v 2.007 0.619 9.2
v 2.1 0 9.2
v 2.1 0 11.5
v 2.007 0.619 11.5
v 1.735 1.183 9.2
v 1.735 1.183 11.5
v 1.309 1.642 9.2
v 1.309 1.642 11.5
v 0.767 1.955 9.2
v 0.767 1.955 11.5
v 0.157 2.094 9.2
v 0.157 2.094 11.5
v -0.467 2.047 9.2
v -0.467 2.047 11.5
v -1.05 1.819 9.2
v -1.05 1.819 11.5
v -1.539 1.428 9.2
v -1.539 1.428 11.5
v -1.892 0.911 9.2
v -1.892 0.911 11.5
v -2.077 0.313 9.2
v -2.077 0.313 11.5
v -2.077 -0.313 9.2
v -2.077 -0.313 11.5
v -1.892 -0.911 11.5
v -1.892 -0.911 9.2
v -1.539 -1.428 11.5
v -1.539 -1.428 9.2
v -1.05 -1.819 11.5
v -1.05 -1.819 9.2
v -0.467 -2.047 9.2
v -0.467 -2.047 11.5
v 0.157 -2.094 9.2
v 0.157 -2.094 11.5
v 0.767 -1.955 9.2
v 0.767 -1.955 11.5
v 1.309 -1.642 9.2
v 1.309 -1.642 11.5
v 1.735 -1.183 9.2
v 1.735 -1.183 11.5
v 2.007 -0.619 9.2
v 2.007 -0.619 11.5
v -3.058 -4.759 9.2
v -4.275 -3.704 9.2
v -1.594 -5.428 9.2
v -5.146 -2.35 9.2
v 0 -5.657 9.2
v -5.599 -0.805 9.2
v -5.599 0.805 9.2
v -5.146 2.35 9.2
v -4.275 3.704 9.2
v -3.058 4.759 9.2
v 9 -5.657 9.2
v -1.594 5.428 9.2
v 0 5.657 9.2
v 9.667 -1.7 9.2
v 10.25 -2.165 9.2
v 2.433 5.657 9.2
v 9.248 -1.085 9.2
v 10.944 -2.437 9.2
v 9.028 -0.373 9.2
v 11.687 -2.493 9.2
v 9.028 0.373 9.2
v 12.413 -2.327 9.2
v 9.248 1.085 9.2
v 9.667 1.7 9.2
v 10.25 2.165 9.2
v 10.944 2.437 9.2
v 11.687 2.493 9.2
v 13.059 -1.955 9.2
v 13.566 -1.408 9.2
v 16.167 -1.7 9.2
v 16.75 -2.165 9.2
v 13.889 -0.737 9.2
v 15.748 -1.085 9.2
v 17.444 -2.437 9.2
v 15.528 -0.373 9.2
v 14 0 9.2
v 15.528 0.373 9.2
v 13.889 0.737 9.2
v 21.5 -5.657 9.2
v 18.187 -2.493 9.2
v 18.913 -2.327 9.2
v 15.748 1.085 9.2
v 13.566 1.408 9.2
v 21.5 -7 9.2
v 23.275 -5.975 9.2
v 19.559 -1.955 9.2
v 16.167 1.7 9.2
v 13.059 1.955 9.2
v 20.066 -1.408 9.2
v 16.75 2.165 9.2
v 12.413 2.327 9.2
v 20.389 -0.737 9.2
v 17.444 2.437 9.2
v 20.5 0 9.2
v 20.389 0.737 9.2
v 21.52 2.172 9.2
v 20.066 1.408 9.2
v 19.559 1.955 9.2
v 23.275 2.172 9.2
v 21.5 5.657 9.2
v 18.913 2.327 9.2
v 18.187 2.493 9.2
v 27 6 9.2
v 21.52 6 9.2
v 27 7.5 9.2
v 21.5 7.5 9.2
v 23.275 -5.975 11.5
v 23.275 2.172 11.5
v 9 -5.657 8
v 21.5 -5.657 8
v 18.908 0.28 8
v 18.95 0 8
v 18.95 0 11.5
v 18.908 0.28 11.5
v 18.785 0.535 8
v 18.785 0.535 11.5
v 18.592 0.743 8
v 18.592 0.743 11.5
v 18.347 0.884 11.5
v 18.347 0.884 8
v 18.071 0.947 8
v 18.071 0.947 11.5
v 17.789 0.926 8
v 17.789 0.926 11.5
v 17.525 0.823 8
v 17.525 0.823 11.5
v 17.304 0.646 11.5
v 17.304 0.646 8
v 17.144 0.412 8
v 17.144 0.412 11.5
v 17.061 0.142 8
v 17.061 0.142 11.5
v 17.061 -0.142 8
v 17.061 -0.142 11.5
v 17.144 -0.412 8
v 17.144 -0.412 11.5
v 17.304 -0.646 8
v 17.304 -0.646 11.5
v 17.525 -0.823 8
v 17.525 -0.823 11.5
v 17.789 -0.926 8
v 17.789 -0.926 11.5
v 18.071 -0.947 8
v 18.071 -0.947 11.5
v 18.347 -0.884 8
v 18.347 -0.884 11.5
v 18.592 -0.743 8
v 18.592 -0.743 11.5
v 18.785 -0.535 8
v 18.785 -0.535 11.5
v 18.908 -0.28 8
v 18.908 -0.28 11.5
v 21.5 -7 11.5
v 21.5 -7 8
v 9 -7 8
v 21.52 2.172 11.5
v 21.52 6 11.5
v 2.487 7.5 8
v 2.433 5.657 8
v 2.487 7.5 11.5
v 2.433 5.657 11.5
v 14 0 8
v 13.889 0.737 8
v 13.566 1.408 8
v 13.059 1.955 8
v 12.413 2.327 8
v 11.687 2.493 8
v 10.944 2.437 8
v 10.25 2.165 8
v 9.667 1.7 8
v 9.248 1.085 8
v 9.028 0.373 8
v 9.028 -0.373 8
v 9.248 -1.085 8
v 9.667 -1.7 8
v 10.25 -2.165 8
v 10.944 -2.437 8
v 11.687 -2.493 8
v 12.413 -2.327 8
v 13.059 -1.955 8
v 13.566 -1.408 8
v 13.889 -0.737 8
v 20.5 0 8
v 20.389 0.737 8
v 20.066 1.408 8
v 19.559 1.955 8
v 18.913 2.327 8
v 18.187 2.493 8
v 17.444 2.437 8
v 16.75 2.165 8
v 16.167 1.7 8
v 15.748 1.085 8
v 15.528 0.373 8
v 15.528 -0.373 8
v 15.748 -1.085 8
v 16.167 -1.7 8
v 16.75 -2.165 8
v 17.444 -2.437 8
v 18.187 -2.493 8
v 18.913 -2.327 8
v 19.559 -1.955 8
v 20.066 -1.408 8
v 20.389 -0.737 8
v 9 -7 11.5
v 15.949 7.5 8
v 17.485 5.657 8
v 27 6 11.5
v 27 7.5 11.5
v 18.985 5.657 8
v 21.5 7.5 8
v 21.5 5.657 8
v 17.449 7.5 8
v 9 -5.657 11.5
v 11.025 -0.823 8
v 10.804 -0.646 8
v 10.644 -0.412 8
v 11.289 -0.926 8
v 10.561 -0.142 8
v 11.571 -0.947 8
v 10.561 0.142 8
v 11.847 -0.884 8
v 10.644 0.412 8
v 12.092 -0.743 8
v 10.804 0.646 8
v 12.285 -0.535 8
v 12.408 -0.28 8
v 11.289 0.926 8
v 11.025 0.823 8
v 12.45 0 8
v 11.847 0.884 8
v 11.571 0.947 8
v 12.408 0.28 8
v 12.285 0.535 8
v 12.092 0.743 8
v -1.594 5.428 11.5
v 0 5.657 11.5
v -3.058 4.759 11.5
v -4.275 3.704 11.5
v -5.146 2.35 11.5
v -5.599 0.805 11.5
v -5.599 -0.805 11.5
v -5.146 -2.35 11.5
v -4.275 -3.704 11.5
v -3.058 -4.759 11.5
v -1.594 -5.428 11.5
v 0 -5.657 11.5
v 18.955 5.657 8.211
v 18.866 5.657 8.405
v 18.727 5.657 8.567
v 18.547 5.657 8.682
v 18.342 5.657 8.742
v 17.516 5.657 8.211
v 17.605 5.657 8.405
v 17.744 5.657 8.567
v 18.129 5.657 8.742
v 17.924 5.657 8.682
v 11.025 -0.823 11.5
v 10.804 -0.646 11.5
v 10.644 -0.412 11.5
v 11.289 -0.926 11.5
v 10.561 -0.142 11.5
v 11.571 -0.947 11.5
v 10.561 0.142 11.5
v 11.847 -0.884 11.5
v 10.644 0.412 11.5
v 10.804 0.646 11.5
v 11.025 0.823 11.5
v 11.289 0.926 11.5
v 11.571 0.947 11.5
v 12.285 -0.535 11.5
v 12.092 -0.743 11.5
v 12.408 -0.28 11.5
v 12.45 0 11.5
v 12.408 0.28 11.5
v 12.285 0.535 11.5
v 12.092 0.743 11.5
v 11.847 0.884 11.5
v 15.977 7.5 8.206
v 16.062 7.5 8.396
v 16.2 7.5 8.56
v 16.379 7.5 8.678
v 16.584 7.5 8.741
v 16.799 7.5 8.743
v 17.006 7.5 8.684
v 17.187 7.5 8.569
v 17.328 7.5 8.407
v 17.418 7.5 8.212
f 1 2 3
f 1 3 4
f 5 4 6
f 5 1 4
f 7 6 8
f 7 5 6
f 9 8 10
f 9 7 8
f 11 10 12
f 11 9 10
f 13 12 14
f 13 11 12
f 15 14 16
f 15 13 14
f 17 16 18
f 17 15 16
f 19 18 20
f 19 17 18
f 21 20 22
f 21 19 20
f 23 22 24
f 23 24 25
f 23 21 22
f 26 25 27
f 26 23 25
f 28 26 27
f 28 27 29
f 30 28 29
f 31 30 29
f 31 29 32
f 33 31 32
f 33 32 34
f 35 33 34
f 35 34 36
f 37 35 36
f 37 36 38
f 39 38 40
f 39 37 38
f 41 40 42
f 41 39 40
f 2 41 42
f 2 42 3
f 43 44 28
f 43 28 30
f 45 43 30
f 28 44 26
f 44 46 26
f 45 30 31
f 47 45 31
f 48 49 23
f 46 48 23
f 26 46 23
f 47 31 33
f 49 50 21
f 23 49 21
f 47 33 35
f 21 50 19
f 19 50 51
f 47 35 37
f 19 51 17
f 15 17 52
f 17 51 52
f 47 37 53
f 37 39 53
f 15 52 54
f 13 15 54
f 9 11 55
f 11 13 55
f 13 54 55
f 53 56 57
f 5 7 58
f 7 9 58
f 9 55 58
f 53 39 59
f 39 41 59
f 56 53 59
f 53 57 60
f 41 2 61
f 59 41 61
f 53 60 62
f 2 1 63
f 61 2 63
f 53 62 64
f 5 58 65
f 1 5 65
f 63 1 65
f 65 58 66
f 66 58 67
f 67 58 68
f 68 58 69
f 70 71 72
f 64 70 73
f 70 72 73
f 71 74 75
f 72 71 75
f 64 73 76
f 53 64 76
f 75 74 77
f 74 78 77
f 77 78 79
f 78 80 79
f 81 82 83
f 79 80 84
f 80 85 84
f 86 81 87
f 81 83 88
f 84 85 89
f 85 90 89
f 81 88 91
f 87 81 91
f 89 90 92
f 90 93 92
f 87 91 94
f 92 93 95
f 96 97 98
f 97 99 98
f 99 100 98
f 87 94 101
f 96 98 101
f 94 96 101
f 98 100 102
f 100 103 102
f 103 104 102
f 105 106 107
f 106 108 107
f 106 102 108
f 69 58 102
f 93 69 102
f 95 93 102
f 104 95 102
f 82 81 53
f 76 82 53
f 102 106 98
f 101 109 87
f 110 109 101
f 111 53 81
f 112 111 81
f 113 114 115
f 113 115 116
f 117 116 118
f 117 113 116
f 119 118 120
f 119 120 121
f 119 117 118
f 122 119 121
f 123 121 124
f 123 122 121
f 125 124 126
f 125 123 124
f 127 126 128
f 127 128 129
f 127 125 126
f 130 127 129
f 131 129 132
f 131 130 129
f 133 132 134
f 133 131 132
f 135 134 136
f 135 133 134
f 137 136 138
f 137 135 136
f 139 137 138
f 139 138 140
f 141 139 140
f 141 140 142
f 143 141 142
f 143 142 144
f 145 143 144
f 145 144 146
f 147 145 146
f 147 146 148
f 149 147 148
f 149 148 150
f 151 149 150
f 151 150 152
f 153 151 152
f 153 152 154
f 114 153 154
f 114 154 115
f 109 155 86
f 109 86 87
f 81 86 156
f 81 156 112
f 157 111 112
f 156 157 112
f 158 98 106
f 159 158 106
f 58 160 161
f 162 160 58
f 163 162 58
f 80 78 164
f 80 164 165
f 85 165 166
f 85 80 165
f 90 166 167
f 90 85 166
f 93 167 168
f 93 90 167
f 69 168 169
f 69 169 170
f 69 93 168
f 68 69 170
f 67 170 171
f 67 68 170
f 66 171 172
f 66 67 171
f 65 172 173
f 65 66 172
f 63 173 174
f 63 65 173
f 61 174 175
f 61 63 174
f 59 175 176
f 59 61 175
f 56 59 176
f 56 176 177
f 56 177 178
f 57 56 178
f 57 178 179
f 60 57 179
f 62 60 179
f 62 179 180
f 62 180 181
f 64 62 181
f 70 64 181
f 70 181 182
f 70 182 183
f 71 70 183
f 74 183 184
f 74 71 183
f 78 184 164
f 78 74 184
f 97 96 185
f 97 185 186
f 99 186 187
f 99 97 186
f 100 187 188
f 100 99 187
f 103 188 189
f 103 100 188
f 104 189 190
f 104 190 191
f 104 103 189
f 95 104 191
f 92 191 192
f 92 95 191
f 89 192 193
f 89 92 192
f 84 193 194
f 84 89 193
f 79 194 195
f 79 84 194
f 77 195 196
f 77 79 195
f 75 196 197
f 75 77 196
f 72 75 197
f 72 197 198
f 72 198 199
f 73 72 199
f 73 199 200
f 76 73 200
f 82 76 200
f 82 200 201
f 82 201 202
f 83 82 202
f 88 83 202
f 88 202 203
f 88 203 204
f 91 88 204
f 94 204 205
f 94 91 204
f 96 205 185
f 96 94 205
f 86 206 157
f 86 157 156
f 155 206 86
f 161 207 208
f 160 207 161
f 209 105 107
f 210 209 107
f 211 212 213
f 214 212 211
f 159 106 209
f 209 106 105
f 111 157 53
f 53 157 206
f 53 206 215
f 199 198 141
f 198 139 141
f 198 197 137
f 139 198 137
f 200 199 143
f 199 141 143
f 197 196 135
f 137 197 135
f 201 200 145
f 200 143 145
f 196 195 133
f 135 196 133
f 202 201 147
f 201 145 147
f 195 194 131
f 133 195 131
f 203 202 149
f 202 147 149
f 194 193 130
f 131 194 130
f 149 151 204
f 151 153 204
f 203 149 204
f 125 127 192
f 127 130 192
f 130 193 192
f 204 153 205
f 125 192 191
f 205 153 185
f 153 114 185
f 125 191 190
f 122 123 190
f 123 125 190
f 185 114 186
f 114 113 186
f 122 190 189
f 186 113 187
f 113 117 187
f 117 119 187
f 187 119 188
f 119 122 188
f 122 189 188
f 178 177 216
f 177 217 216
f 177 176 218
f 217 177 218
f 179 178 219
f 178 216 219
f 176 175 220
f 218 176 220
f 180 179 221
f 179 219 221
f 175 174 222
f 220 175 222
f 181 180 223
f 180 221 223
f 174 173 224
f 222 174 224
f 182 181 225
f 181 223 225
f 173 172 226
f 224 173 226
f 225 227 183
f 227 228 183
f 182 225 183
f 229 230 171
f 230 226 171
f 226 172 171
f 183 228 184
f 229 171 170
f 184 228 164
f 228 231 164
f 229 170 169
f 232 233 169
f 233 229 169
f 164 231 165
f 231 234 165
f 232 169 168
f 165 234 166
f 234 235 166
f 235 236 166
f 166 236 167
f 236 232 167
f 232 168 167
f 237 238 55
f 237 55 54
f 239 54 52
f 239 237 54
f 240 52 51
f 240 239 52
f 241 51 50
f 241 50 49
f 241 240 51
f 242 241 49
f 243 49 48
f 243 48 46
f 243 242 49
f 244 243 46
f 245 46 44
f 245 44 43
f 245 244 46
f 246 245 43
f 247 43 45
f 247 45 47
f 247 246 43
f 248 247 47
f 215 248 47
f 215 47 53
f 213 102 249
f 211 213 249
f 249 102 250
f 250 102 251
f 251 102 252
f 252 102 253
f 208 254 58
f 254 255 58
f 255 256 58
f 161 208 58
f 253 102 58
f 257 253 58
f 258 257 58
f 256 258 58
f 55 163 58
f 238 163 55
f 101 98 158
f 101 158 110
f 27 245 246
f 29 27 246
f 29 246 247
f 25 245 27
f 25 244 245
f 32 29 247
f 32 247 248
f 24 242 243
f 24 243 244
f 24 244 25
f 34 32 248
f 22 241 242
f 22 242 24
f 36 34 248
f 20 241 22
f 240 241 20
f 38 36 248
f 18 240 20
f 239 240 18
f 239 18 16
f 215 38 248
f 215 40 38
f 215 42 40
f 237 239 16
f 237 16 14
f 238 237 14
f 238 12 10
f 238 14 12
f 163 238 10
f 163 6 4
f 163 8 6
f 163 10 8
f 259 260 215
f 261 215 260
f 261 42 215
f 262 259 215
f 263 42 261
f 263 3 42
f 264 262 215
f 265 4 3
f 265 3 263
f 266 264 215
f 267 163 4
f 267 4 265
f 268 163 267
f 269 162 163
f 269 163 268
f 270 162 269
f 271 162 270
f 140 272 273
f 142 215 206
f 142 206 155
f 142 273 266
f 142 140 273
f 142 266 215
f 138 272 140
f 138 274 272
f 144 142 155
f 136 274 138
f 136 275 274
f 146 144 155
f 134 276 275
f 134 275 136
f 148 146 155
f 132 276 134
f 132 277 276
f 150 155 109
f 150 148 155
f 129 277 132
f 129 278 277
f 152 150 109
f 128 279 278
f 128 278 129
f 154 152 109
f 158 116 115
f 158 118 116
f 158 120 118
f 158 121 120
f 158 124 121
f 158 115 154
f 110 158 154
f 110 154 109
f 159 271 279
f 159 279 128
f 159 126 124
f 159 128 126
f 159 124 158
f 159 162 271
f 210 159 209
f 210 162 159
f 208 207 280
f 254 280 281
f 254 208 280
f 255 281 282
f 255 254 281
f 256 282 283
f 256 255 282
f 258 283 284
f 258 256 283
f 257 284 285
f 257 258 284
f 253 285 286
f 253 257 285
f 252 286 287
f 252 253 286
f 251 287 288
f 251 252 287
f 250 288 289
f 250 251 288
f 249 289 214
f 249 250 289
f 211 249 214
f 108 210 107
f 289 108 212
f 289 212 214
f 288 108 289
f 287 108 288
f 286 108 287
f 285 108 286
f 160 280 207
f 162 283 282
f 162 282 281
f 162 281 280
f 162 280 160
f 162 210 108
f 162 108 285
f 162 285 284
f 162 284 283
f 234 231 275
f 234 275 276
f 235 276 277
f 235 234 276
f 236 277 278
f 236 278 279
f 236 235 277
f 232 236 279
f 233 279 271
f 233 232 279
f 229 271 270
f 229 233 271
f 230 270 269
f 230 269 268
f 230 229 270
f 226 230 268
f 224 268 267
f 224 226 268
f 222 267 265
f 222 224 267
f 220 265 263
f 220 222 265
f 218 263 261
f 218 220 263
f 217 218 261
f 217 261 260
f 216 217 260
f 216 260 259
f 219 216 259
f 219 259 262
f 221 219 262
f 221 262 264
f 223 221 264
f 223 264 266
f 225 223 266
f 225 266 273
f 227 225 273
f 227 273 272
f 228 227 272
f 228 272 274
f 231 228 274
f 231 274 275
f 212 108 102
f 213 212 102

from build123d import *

# Parameters (mm, degrees)
BOSS_EXTRUDE1_DEPTH  = 2
BOSS_EXTRUDE6_DEPTH  = 2.5
CUT_EXTRUDE6_DEPTH   = 2.5
BOSS_EXTRUDE14_DEPTH = 2.3
SKETCH32_R           = 2.1
CUT_EXTRUDE7_DEPTH   = 2.3
SKETCH33_W           = 12.5
SKETCH33_H           = 1.343145751
BOSS_EXTRUDE15_DEPTH = 1.2
SKETCH35_W           = 5.479645997
SKETCH35_H           = 3.827993755
CUT_EXTRUDE8_DEPTH   = 2.4
SKETCH36_W           = 3.7
SKETCH36_H           = 1.827993755
CUT_EXTRUDE9_DEPTH   = 2.4
SKETCH37_R           = 3.9
BOSS_EXTRUDE16_DEPTH = 2.3
CUT_EXTRUDE10_DEPTH  = 5.3
SKETCH43_R           = 2.5
BOSS_EXTRUDE17_DEPTH = 1.2
SKETCH44_R           = 0.95
CUT_EXTRUDE11_DEPTH  = 9
SKETCH45_R           = 2
CUT_EXTRUDE12_DEPTH  = 2.5
SKETCH52_R           = 0.75
CUT_EXTRUDE13_DEPTH  = 10


with BuildPart() as part:
    # Sketch3 → Boss-Extrude1 (new body)
    with BuildSketch(Plane.XY):
        with BuildLine():
            Line((8, 0), (9, -2.5))
            Line((9, -2.5), (9, -7))
            Line((9, -7), (21.5, -7))
            Line((21.5, -7), (25.050252532, -4.949747468))
            ThreePointArc((25.050252532, -4.949747468), (36.467156728, -2.678784027), (30, 7))
            Line((30, 7), (27, 7.5))
            Line((27, 7.5), (5.656854249, 7.5))
            Line((5.656854249, 7.5), (5.656854249, 5.656854249))
            ThreePointArc((5.656854249, 5.656854249), (7.39103626, 3.061467459), (8, 0))
        make_face()
    extrude(amount=BOSS_EXTRUDE1_DEPTH)

    # Sketch22 → Boss-Extrude6 (add)
    with BuildSketch(Plane.XY.offset(2)):
        with BuildLine():
            Line((5.656854249, 5.656854249), (2.486790148, 5.656854249))
            Line((2.486790148, 5.656854249), (2.486790148, 7.5))
            Line((2.486790148, 7.5), (5.656854249, 7.5))
            Line((5.656854249, 7.5), (21.5, 7.5))
            Line((21.5, 7.5), (27, 7.5))
            Line((27, 7.5), (27, 2.172006245))
            Line((27, 2.172006245), (23.275126266, 2.172006245))
            Line((23.275126266, 2.172006245), (23.275126266, -5.974873734))
            Line((23.275126266, -5.974873734), (21.5, -7))
            Line((21.5, -7), (9, -7))
            Line((9, -7), (9, -2.5))
            Line((9, -2.5), (8, 0))
            ThreePointArc((8, 0), (7.39103626, 3.061467459), (5.656854249, 5.656854249))
        make_face()
    extrude(amount=BOSS_EXTRUDE6_DEPTH)

    # Sketch26 → Cut-Extrude6 (cut)
    with BuildSketch(Plane.XY.offset(2)):
        Polygon((18.098080448, 5.3), (2.530052458, 5.3), (2.530052458, 4), (18.098080448, 4), (27, 4), (27, 5.3), align=None)
    extrude(amount=CUT_EXTRUDE6_DEPTH, mode=Mode.SUBTRACT)


with BuildPart() as body_2:
    # Sketch31 → Boss-Extrude14 (new body)
    with BuildSketch(Plane.XY.offset(4.5)):
        with BuildLine():
            Line((2.432688066, 5.656854249), (0, 5.656854249))
            ThreePointArc((0, 5.656854249), (-5.656854249, 0), (0, -5.656854249))
            Line((0, -5.656854249), (9, -5.656854249))
            Line((9, -5.656854249), (9, -7))
            Line((9, -7), (21.5, -7))
            Line((21.5, -7), (23.275126266, -5.974873734))
            Line((23.275126266, -5.974873734), (23.275126266, 2.172006245))
            Line((23.275126266, 2.172006245), (27, 2.172006245))
            Line((27, 2.172006245), (27, 7.5))
            Line((27, 7.5), (2.486790148, 7.5))
            Line((2.486790148, 7.5), (2.432688066, 5.656854249))
        make_face()
    extrude(amount=BOSS_EXTRUDE14_DEPTH)

    # Sketch32 → Cut-Extrude7 (cut)
    with BuildSketch(Plane.XY.offset(6.8)):
        Circle(SKETCH32_R)
    extrude(amount=-CUT_EXTRUDE7_DEPTH, mode=Mode.SUBTRACT)

    # Sketch33 → Boss-Extrude15 (add)
    with BuildSketch(Plane.XY.offset(6.8)):
        with Locations((15.25, -6.328427125)):
            Rectangle(SKETCH33_W, SKETCH33_H)
        Polygon((2.486790148, 7.5), (21.5, 7.5), (21.5, 5.656854249), (2.432688066, 5.656854249), align=None)
    extrude(amount=BOSS_EXTRUDE15_DEPTH)


with BuildPart() as cut_extrude8_tool:
    # Sketch35 → Cut-Extrude8 (new body)
    with BuildSketch(Plane.XY.offset(6.8)):
        with Locations((24.260177002, 4.086003123)):
            Rectangle(SKETCH35_W, SKETCH35_H)
    extrude(amount=-CUT_EXTRUDE8_DEPTH)


with BuildPart() as part_1:
    add(part.part)

    # Cut-Extrude8: cut by cut_extrude8_tool
    add(cut_extrude8_tool.part, mode=Mode.SUBTRACT)

    # Sketch36 → Cut-Extrude9 (cut)
    with BuildSketch(Plane.XY.offset(4.4)):
        with Locations((25.15, 3.086003123)):
            Rectangle(SKETCH36_W, SKETCH36_H)
    extrude(amount=-CUT_EXTRUDE9_DEPTH, mode=Mode.SUBTRACT)

    # Sketch37 → Boss-Extrude16 (add)
    with BuildSketch(Plane.XY.offset(2)):
        with Locations((30, 0)):
            Circle(SKETCH37_R)
    extrude(amount=BOSS_EXTRUDE16_DEPTH)

    # Sketch39 → Cut-Extrude10 (cut, through all)
    with BuildSketch(Plane.XY.offset(4.3)):
        with BuildLine():
            Line((29, 1.732050808), (29, -1.732050808))
            ThreePointArc((29, -1.732050808), (32, 0), (29, 1.732050808))
        make_face()
    extrude(amount=-CUT_EXTRUDE10_DEPTH, mode=Mode.SUBTRACT)


with BuildPart() as body_2_1:
    add(body_2.part)

    # Cut-Extrude8: cut by cut_extrude8_tool
    add(cut_extrude8_tool.part, mode=Mode.SUBTRACT)

    # Sketch43 → Boss-Extrude17 (add)
    with BuildSketch(Plane.XY.offset(6.8)):
        with Locations((11.5, 0)):
            Circle(SKETCH43_R)
        with Locations((18, 0)):
            Circle(SKETCH43_R)
    extrude(amount=BOSS_EXTRUDE17_DEPTH)


with BuildPart() as cut_extrude11_tool:
    # Sketch44 → Cut-Extrude11 (new body, through all)
    with BuildSketch(Plane.XY.offset(8)):
        with Locations((11.5, 0)):
            Circle(SKETCH44_R)
        with Locations((18, 0)):
            Circle(SKETCH44_R)
    extrude(amount=-CUT_EXTRUDE11_DEPTH)


with BuildPart() as part_2:
    add(part_1.part)

    # Cut-Extrude11: cut by cut_extrude11_tool
    add(cut_extrude11_tool.part, mode=Mode.SUBTRACT)

    # Sketch45 → Cut-Extrude12 (cut)
    with BuildSketch(Plane(origin=(0, 0, 0), x_dir=(-1, 0, 0), z_dir=(0, 0, -1))):
        with Locations((-11.5, 0)):
            Circle(SKETCH45_R)
        with Locations((-18, 0)):
            Circle(SKETCH45_R)
    extrude(amount=-CUT_EXTRUDE12_DEPTH, mode=Mode.SUBTRACT)


with BuildPart() as body_2_2:
    add(body_2_1.part)

    # Cut-Extrude11: cut by cut_extrude11_tool
    add(cut_extrude11_tool.part, mode=Mode.SUBTRACT)

    # Sketch52 → Cut-Extrude13 (cut, along a direction that is not the sketch's normal)
    with BuildSketch(Plane.XZ.offset(-5.656854249)):
        with Locations((18.235476819, 8)):
            Circle(SKETCH52_R)
    extrude(amount=-CUT_EXTRUDE13_DEPTH, dir=(0.640410196, -0.76803306, 0), mode=Mode.SUBTRACT)


with BuildPart() as body_3:
    # Mirror1: mirrored copy
    add(body_2_2.part.mirror(Plane.XY.offset(8)))


with BuildPart() as body_4:
    # Mirror1 2: mirrored copy
    add(part_2.part.mirror(Plane.XY.offset(8)))


solid = body_3.part
